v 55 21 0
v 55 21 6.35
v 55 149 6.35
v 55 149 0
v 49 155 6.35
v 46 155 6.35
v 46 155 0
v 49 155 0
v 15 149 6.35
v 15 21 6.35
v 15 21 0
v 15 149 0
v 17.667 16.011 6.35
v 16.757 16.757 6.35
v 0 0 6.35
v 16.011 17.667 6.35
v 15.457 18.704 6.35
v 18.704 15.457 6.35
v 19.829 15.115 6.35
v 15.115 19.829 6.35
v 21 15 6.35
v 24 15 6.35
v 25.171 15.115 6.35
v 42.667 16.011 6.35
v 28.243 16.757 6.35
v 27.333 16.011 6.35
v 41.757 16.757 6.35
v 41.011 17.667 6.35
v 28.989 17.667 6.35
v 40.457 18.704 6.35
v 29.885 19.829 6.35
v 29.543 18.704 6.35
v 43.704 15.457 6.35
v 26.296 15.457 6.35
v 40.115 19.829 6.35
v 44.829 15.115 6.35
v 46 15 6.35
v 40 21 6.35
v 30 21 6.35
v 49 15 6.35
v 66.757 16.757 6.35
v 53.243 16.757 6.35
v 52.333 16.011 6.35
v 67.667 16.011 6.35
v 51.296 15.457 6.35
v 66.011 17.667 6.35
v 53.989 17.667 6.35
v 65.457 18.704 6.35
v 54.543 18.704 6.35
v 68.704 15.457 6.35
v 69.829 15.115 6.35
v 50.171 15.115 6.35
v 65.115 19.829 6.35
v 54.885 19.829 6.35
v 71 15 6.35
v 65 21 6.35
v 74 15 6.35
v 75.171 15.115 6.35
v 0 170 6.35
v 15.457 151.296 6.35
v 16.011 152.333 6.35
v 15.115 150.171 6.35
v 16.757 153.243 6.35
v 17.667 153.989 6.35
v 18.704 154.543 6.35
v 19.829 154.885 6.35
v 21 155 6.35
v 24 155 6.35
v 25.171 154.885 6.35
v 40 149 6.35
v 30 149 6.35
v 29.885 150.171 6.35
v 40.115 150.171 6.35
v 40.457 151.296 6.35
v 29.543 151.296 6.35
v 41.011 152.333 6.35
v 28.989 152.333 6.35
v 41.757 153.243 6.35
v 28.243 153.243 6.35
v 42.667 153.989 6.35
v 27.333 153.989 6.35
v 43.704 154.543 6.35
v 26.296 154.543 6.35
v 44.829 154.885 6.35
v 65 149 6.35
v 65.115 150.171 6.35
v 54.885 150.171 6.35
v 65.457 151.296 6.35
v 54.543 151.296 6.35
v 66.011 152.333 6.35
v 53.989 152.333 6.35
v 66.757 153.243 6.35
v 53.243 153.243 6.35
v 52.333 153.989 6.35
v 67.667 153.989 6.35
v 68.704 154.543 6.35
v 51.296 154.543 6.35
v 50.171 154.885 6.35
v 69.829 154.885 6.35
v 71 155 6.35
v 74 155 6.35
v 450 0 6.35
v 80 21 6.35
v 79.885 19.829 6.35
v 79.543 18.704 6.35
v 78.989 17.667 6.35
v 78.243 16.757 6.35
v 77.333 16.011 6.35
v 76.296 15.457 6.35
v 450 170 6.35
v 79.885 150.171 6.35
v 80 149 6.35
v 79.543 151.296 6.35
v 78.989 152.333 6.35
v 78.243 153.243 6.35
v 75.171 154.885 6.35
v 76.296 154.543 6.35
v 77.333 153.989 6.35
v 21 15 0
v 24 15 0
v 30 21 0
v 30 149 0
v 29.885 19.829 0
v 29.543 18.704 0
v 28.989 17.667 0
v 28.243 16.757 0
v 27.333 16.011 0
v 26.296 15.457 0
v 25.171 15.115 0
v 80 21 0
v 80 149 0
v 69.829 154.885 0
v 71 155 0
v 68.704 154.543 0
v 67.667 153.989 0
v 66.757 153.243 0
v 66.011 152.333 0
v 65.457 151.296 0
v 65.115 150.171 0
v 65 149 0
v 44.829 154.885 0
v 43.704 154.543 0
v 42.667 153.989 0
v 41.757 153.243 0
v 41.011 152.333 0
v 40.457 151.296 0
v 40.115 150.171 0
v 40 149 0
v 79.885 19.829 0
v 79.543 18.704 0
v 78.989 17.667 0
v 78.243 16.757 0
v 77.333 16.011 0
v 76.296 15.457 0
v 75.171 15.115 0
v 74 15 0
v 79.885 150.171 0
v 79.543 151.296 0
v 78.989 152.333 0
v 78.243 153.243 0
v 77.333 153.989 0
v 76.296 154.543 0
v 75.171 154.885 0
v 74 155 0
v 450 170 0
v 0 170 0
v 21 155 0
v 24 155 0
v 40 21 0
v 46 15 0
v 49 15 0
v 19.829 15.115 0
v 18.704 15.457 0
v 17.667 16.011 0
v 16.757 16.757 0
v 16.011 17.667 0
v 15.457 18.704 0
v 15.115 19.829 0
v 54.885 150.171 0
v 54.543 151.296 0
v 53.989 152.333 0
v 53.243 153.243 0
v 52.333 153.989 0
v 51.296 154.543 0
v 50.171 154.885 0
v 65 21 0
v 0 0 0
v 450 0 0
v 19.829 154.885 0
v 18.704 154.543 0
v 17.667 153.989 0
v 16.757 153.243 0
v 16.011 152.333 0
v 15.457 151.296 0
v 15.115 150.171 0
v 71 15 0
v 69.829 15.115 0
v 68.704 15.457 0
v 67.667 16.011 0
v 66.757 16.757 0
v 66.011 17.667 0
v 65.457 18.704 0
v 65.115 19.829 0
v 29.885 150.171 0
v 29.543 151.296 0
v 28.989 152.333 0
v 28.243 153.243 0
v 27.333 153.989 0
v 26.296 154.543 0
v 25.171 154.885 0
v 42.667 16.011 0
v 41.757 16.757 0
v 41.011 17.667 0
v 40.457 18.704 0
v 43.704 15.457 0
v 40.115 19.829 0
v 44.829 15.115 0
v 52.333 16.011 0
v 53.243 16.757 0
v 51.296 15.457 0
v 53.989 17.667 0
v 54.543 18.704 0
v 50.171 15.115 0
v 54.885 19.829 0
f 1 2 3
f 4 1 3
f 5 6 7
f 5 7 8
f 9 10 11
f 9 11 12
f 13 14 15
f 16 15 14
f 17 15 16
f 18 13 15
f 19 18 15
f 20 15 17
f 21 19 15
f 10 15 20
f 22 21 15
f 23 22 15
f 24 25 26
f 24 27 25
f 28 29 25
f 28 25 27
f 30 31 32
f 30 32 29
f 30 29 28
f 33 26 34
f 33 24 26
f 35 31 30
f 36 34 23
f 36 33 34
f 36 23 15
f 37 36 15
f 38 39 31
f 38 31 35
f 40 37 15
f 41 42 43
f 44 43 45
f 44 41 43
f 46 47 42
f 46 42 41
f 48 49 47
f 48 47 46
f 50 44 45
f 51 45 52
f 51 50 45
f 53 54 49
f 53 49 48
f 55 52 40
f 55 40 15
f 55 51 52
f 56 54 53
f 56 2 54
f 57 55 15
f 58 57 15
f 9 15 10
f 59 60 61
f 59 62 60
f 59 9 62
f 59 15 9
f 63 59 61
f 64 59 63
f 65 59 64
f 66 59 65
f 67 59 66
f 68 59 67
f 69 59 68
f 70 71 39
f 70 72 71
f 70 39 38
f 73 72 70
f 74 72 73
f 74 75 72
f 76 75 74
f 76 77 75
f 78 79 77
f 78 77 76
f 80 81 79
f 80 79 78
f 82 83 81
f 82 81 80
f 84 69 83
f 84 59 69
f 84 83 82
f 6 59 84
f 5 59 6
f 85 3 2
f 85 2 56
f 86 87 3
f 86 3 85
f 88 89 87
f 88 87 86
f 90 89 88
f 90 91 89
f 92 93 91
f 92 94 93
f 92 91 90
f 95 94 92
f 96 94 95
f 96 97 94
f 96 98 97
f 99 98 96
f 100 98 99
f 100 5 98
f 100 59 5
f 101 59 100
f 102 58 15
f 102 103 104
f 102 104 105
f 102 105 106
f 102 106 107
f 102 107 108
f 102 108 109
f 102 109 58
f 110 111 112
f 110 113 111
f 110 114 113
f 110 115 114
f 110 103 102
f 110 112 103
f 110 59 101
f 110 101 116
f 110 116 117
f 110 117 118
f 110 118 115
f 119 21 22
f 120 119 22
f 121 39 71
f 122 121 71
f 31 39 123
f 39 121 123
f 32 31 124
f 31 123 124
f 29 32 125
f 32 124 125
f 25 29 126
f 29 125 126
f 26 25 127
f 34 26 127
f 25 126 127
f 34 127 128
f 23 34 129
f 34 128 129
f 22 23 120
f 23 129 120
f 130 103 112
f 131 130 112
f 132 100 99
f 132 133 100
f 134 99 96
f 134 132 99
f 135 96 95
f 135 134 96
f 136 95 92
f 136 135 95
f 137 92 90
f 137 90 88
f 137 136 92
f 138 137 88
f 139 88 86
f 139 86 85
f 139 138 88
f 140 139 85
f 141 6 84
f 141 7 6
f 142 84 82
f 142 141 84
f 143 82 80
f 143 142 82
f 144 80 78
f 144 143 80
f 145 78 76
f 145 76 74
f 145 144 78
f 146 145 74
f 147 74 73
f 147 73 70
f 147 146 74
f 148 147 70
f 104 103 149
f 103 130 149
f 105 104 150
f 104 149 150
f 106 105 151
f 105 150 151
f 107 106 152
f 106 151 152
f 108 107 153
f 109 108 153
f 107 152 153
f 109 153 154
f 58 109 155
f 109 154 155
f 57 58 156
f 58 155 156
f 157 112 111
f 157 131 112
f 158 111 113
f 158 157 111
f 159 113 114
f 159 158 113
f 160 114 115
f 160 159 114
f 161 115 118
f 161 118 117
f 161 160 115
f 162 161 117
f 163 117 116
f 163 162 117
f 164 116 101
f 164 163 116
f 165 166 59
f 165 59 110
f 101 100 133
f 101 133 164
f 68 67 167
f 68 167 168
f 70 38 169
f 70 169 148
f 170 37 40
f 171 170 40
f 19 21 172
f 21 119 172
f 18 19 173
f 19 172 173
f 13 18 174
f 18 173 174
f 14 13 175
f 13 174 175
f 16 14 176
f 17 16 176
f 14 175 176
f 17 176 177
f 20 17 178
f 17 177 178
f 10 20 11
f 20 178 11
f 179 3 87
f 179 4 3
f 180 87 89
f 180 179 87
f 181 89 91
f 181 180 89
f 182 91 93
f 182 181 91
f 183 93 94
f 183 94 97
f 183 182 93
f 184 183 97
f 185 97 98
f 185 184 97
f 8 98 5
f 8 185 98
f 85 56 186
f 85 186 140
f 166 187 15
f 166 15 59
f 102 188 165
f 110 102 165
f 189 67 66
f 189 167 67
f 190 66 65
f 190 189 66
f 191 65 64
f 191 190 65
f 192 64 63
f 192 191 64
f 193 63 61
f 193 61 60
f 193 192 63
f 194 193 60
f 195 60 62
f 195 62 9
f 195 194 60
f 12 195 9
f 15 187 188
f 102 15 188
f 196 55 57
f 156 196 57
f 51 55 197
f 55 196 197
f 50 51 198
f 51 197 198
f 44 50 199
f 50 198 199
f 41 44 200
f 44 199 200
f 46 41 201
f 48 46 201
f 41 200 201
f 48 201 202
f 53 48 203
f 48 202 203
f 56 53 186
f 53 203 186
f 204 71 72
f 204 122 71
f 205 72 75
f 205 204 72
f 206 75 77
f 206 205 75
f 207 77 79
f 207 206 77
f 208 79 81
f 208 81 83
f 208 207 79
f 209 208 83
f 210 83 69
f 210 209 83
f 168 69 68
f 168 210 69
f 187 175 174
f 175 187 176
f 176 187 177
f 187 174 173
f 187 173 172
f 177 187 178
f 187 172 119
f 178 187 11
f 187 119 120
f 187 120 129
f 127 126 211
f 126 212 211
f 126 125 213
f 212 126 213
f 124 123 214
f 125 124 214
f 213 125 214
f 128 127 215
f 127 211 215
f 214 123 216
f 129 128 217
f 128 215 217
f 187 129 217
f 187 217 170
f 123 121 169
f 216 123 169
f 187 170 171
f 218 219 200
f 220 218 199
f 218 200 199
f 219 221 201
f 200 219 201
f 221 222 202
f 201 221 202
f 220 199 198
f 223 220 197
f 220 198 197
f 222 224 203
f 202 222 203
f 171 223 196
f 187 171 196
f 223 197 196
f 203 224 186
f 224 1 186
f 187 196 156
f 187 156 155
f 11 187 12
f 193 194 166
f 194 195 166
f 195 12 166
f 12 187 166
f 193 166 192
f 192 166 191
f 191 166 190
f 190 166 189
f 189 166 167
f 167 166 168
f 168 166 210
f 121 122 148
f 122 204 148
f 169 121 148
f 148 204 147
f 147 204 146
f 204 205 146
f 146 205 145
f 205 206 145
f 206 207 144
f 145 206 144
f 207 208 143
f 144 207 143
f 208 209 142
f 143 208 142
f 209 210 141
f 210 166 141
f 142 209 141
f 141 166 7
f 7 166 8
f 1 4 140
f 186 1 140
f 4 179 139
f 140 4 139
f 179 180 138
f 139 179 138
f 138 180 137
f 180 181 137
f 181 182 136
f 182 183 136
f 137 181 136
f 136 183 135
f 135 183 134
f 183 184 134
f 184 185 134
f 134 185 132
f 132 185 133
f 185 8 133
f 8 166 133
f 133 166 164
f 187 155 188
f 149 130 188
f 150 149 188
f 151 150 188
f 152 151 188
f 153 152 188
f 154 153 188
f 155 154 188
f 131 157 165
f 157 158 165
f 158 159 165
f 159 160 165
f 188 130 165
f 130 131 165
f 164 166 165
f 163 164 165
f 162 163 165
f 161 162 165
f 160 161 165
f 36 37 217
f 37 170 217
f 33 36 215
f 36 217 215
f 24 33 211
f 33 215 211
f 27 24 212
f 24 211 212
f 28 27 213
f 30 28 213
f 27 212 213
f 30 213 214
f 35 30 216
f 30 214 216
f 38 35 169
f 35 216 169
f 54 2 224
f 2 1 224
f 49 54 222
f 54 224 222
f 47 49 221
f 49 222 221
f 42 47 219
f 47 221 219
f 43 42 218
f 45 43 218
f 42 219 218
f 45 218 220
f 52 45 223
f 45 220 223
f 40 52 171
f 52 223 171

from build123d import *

# Parameters (mm, degrees)
SKETCH1_W               = 450
SKETCH1_H               = 170
BOSS_EXTRUDE1_DEPTH     = 6.35
SKETCH2_W               = 15
SKETCH2_H               = 140
CUT_EXTRUDE1_DEPTH      = 1
CUT_EXTRUDE1_DEPTH_BACK = 7.35
FILLET1_R               = 6
FILLET2_R               = 6


with BuildPart() as part:
    # Sketch1 → Boss-Extrude1 (new body)
    with BuildSketch(Plane.XY):
        with Locations((225, 85)):
            Rectangle(SKETCH1_W, SKETCH1_H)
    extrude(amount=BOSS_EXTRUDE1_DEPTH)

    # Sketch2 → Cut-Extrude1 (cut, two sides)
    with BuildSketch(Plane.XY.offset(6.35)) as cut_extrude1_sk:
        with Locations((22.5, 85)):
            Rectangle(SKETCH2_W, SKETCH2_H)
        with Locations((47.5, 85)):
            Rectangle(SKETCH2_W, SKETCH2_H)
        with Locations((72.5, 85)):
            Rectangle(SKETCH2_W, SKETCH2_H)
    extrude(amount=CUT_EXTRUDE1_DEPTH, mode=Mode.SUBTRACT)
    extrude(cut_extrude1_sk.sketch, amount=-CUT_EXTRUDE1_DEPTH_BACK, mode=Mode.SUBTRACT)

    # Fillet1
    fillet1_edges = [part.edges().sort_by_distance(p)[0] for p in [
        (15, 155, 3.175),
        (30, 155, 3.175),
        (40, 155, 3.175),
        (55, 155, 3.175),
        (80, 155, 3.175),
        (65, 155, 3.175),
    ]]
    fillet(fillet1_edges, radius=FILLET1_R)

    # Fillet2
    fillet2_edges = [part.edges().sort_by_distance(p)[0] for p in [
        (30, 15, 3.175),
        (15, 15, 3.175),
        (55, 15, 3.175),
        (40, 15, 3.175),
        (80, 15, 3.175),
        (65, 15, 3.175),
    ]]
    fillet(fillet2_edges, radius=FILLET2_R)


solid = part.part
